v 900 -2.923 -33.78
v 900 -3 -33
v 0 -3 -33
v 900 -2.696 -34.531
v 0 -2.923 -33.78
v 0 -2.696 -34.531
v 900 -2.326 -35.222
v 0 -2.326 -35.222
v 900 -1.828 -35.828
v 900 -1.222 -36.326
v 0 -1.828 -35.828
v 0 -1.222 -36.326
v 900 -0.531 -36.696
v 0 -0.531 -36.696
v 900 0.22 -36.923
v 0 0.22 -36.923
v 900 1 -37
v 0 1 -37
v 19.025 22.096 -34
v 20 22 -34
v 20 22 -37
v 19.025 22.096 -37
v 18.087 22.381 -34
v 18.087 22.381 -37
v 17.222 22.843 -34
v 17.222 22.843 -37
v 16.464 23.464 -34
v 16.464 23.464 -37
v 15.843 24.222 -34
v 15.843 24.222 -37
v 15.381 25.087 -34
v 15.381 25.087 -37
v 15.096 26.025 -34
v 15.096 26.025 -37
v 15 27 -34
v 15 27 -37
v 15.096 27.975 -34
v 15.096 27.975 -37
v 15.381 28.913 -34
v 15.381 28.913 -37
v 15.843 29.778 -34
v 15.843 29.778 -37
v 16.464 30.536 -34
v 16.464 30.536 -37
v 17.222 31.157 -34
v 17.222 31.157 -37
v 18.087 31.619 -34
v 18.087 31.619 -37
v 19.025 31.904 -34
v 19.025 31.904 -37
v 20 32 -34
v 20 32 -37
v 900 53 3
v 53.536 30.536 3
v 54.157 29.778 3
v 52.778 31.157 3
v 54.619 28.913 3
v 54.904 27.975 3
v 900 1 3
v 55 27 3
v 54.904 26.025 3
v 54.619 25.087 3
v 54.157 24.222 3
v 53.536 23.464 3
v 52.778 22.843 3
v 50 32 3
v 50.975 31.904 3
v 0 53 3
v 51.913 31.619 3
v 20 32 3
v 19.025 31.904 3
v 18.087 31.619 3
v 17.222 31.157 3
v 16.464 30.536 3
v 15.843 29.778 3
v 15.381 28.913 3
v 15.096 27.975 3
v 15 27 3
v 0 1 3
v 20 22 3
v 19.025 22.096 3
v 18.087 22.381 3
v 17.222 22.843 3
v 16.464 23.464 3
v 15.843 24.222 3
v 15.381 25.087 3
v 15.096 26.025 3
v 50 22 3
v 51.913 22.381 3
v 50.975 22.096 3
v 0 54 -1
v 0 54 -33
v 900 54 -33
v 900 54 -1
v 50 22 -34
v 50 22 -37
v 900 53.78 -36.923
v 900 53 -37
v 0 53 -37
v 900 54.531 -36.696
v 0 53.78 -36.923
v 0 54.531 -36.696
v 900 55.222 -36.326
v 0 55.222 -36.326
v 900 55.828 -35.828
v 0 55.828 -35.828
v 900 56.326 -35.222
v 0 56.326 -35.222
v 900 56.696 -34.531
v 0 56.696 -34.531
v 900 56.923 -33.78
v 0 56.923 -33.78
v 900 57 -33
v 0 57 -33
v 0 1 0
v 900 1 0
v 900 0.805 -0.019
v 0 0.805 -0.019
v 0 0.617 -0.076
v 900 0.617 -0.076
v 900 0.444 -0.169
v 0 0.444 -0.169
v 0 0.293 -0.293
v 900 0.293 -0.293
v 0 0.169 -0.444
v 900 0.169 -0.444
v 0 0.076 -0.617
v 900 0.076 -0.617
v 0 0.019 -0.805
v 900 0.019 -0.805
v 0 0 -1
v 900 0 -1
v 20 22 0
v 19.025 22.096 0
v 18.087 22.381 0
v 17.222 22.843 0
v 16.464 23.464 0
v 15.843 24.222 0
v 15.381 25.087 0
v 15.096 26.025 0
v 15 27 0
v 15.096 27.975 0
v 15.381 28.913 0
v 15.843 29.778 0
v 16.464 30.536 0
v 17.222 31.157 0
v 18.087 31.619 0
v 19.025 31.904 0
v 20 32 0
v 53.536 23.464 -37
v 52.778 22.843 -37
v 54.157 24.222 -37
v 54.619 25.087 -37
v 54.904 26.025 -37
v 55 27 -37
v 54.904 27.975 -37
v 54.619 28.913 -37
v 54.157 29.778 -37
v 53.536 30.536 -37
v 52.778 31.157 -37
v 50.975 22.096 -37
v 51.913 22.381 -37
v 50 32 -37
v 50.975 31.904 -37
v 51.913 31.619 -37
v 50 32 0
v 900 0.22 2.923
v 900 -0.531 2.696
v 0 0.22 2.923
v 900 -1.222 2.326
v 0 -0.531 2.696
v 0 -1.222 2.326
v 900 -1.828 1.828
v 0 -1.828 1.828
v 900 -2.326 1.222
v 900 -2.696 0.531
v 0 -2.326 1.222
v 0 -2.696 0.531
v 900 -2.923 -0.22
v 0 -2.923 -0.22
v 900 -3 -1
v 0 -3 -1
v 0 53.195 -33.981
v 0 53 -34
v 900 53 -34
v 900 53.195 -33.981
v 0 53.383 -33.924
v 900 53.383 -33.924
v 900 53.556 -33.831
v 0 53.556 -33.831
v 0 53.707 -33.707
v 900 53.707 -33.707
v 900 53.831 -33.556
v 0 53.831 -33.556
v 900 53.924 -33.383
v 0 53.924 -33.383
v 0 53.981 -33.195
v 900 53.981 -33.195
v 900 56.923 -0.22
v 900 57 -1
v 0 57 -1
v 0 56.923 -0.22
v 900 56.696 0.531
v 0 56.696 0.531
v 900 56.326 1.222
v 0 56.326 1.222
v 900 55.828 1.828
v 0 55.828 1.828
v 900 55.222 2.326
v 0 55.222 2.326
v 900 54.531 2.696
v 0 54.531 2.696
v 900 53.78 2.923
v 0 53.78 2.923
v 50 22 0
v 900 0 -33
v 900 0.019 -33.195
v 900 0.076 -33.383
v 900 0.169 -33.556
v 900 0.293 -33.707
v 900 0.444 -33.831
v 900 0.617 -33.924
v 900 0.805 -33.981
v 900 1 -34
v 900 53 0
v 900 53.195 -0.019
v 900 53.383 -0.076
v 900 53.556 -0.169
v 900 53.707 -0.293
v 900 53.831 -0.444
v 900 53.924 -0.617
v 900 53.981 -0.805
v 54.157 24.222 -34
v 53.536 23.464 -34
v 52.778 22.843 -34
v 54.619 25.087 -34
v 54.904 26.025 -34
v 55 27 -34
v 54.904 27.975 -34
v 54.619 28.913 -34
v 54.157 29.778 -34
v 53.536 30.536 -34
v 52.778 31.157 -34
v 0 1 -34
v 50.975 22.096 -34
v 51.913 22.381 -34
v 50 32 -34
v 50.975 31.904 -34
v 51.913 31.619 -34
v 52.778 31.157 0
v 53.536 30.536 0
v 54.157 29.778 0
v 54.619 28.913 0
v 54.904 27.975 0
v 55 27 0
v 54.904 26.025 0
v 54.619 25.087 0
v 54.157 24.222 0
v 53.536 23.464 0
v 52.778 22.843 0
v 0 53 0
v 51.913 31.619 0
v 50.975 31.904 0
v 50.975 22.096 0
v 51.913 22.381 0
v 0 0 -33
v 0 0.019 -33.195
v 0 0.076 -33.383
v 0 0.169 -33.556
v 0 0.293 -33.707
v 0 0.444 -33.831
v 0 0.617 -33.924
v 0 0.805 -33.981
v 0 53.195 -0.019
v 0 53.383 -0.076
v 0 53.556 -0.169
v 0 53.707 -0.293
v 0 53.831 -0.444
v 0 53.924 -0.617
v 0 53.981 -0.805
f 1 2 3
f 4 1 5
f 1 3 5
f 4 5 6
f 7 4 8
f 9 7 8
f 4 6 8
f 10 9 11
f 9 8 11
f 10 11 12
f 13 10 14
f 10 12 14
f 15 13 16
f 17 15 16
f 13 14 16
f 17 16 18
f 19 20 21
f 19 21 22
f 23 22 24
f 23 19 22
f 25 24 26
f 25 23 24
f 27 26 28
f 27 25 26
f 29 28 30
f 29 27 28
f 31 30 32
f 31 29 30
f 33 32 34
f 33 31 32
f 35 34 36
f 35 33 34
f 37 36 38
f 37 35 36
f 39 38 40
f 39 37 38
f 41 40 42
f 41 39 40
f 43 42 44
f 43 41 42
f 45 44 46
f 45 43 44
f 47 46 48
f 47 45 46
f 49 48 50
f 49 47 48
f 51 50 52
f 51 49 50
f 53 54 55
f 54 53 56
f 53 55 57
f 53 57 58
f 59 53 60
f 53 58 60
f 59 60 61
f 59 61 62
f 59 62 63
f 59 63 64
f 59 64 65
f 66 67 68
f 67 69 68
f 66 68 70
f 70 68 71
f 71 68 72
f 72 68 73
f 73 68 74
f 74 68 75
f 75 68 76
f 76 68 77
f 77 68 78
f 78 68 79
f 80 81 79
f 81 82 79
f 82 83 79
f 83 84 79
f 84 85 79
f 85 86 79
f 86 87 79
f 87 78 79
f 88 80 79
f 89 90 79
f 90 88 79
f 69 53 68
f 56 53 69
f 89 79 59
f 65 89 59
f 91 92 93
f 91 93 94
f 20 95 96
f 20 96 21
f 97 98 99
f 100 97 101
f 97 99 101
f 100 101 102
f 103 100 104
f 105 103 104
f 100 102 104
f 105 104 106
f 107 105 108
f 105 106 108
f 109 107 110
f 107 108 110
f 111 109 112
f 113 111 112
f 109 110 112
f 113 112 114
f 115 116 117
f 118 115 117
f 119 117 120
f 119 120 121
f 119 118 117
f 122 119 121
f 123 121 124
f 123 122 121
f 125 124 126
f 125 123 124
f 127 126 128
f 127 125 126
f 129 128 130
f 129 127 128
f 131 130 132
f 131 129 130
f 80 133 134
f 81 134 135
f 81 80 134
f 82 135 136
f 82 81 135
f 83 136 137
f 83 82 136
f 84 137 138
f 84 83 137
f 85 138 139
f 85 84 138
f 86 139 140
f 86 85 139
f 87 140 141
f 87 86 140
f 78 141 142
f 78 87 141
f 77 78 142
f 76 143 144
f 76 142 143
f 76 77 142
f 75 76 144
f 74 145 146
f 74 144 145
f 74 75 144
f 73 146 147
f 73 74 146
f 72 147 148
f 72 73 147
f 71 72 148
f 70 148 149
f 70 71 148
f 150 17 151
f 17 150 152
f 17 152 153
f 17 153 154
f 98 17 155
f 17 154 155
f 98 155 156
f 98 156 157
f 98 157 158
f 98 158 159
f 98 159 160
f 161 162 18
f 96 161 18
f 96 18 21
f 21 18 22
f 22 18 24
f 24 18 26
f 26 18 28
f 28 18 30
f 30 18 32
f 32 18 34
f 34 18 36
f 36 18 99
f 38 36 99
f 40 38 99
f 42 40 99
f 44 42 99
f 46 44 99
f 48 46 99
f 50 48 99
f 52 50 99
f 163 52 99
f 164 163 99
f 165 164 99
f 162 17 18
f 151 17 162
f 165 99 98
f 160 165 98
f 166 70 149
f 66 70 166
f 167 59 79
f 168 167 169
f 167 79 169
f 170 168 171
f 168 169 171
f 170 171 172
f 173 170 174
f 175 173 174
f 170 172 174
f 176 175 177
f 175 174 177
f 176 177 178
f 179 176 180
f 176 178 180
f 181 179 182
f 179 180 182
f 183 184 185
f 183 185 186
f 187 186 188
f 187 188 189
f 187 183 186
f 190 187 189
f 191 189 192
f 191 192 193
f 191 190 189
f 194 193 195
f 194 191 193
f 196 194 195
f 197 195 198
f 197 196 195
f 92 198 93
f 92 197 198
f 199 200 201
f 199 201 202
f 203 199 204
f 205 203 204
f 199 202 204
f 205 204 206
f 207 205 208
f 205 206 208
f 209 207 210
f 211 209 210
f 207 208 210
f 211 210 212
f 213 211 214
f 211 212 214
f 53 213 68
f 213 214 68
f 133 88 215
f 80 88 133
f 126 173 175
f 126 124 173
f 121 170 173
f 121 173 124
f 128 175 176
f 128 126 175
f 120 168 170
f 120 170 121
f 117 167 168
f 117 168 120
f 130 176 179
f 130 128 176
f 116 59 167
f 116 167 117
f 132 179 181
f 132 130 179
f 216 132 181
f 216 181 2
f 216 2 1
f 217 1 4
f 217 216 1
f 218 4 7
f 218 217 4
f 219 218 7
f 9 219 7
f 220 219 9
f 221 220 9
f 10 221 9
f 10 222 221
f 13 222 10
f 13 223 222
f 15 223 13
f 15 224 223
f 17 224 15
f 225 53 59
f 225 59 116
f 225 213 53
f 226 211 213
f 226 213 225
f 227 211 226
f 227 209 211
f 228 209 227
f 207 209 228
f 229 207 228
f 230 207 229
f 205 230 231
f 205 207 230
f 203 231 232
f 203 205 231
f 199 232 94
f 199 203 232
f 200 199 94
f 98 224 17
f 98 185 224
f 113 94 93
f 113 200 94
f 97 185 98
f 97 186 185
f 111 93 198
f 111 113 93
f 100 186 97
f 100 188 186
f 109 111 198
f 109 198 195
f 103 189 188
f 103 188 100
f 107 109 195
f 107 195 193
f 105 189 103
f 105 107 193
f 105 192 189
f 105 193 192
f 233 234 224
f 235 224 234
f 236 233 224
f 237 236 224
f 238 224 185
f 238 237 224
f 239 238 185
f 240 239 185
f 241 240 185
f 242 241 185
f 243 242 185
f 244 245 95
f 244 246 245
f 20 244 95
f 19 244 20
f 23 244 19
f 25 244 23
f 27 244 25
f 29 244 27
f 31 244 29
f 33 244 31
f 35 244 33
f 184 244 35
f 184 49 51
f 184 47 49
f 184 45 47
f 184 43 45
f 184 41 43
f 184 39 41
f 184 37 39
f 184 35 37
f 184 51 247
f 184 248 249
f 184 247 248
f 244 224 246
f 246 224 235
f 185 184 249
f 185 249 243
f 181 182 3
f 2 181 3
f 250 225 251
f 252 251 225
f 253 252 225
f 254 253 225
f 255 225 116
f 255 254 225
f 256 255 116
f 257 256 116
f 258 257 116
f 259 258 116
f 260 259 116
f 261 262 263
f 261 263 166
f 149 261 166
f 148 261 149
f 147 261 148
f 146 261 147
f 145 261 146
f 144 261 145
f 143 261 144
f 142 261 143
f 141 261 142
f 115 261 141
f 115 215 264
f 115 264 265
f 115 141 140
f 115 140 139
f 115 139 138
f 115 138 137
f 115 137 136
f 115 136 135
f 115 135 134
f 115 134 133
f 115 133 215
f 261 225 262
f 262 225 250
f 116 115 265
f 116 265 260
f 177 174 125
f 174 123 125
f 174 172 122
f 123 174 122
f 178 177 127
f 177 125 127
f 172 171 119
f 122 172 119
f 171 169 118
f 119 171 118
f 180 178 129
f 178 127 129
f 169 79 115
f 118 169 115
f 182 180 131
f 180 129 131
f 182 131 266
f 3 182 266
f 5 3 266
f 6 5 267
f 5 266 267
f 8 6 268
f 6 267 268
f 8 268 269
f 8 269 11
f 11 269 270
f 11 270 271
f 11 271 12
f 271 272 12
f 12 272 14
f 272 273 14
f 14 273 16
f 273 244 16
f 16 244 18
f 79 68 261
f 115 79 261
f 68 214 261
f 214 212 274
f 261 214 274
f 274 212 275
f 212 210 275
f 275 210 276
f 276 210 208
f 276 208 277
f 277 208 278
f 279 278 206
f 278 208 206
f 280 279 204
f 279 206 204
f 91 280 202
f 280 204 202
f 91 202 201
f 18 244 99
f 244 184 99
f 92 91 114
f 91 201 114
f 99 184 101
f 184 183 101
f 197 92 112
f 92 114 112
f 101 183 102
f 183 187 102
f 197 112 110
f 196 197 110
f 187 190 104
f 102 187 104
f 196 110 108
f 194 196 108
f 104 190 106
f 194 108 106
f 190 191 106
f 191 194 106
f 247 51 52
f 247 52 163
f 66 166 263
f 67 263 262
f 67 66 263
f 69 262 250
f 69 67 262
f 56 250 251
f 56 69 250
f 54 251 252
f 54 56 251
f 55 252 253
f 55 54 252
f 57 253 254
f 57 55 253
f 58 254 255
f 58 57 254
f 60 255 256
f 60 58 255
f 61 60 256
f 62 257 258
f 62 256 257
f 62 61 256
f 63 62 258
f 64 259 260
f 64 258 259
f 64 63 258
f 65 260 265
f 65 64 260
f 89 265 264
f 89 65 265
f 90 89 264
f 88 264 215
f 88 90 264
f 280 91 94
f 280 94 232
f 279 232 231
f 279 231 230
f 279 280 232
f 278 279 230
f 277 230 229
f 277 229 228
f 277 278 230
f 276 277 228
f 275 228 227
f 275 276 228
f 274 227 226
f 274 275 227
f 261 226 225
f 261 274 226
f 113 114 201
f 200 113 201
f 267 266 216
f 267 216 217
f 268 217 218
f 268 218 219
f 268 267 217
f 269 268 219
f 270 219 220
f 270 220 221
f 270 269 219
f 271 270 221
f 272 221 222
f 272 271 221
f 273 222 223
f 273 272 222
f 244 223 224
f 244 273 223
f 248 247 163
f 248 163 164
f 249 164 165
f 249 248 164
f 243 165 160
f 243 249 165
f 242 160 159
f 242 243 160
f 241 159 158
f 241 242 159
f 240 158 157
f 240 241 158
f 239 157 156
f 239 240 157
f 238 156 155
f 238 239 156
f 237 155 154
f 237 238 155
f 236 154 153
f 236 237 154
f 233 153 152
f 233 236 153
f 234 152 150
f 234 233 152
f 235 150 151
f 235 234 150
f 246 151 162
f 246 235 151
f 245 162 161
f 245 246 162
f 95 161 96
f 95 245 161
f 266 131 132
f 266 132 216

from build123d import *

# Parameters (mm, degrees)
EXTRUDE_1_DEPTH     = 900
CUT_EXTRUDE_1_DEPTH = 40


with BuildPart() as part:
    # Эскиз1 → Вытянуть-Тонкостенный1 (new body)
    with BuildSketch(Plane(origin=(0, 0, 0), x_dir=(0, 0, -1), z_dir=(1, 0, 0))):
        with BuildLine():
            Line((-3, 53), (-3, 1))
            ThreePointArc((-3, 1), (-1.828427125, -1.828427125), (1, -3))
            Line((1, -3), (33, -3))
            ThreePointArc((33, -3), (35.828427125, -1.828427125), (37, 1))
            Line((37, 1), (37, 53))
            ThreePointArc((37, 53), (35.828427125, 55.828427125), (33, 57))
            Line((33, 57), (1, 57))
            ThreePointArc((1, 57), (-1.828427125, 55.828427125), (-3, 53))
        make_face()
        with BuildLine():
            Line((0, 53), (0, 1))
            ThreePointArc((0, 1), (0.292893219, 0.292893219), (1, 0))
            Line((1, 0), (33, 0))
            ThreePointArc((33, 0), (33.707106781, 0.292893219), (34, 1))
            Line((34, 1), (34, 53))
            ThreePointArc((34, 53), (33.707106781, 53.707106781), (33, 54))
            Line((33, 54), (1, 54))
            ThreePointArc((1, 54), (0.292893219, 53.707106781), (0, 53))
        make_face(mode=Mode.SUBTRACT)
    extrude(amount=EXTRUDE_1_DEPTH)

    # Эскиз2 → Вырез-Вытянуть1 (cut)
    with BuildSketch(Plane.XY.offset(3)):
        with BuildLine():
            Line((20, 32), (50, 32))
            ThreePointArc((50, 32), (55, 27), (50, 22))
            Line((50, 22), (20, 22))
            ThreePointArc((20, 22), (15, 27), (20, 32))
        make_face()
    extrude(amount=-CUT_EXTRUDE_1_DEPTH, mode=Mode.SUBTRACT)


solid = part.part
